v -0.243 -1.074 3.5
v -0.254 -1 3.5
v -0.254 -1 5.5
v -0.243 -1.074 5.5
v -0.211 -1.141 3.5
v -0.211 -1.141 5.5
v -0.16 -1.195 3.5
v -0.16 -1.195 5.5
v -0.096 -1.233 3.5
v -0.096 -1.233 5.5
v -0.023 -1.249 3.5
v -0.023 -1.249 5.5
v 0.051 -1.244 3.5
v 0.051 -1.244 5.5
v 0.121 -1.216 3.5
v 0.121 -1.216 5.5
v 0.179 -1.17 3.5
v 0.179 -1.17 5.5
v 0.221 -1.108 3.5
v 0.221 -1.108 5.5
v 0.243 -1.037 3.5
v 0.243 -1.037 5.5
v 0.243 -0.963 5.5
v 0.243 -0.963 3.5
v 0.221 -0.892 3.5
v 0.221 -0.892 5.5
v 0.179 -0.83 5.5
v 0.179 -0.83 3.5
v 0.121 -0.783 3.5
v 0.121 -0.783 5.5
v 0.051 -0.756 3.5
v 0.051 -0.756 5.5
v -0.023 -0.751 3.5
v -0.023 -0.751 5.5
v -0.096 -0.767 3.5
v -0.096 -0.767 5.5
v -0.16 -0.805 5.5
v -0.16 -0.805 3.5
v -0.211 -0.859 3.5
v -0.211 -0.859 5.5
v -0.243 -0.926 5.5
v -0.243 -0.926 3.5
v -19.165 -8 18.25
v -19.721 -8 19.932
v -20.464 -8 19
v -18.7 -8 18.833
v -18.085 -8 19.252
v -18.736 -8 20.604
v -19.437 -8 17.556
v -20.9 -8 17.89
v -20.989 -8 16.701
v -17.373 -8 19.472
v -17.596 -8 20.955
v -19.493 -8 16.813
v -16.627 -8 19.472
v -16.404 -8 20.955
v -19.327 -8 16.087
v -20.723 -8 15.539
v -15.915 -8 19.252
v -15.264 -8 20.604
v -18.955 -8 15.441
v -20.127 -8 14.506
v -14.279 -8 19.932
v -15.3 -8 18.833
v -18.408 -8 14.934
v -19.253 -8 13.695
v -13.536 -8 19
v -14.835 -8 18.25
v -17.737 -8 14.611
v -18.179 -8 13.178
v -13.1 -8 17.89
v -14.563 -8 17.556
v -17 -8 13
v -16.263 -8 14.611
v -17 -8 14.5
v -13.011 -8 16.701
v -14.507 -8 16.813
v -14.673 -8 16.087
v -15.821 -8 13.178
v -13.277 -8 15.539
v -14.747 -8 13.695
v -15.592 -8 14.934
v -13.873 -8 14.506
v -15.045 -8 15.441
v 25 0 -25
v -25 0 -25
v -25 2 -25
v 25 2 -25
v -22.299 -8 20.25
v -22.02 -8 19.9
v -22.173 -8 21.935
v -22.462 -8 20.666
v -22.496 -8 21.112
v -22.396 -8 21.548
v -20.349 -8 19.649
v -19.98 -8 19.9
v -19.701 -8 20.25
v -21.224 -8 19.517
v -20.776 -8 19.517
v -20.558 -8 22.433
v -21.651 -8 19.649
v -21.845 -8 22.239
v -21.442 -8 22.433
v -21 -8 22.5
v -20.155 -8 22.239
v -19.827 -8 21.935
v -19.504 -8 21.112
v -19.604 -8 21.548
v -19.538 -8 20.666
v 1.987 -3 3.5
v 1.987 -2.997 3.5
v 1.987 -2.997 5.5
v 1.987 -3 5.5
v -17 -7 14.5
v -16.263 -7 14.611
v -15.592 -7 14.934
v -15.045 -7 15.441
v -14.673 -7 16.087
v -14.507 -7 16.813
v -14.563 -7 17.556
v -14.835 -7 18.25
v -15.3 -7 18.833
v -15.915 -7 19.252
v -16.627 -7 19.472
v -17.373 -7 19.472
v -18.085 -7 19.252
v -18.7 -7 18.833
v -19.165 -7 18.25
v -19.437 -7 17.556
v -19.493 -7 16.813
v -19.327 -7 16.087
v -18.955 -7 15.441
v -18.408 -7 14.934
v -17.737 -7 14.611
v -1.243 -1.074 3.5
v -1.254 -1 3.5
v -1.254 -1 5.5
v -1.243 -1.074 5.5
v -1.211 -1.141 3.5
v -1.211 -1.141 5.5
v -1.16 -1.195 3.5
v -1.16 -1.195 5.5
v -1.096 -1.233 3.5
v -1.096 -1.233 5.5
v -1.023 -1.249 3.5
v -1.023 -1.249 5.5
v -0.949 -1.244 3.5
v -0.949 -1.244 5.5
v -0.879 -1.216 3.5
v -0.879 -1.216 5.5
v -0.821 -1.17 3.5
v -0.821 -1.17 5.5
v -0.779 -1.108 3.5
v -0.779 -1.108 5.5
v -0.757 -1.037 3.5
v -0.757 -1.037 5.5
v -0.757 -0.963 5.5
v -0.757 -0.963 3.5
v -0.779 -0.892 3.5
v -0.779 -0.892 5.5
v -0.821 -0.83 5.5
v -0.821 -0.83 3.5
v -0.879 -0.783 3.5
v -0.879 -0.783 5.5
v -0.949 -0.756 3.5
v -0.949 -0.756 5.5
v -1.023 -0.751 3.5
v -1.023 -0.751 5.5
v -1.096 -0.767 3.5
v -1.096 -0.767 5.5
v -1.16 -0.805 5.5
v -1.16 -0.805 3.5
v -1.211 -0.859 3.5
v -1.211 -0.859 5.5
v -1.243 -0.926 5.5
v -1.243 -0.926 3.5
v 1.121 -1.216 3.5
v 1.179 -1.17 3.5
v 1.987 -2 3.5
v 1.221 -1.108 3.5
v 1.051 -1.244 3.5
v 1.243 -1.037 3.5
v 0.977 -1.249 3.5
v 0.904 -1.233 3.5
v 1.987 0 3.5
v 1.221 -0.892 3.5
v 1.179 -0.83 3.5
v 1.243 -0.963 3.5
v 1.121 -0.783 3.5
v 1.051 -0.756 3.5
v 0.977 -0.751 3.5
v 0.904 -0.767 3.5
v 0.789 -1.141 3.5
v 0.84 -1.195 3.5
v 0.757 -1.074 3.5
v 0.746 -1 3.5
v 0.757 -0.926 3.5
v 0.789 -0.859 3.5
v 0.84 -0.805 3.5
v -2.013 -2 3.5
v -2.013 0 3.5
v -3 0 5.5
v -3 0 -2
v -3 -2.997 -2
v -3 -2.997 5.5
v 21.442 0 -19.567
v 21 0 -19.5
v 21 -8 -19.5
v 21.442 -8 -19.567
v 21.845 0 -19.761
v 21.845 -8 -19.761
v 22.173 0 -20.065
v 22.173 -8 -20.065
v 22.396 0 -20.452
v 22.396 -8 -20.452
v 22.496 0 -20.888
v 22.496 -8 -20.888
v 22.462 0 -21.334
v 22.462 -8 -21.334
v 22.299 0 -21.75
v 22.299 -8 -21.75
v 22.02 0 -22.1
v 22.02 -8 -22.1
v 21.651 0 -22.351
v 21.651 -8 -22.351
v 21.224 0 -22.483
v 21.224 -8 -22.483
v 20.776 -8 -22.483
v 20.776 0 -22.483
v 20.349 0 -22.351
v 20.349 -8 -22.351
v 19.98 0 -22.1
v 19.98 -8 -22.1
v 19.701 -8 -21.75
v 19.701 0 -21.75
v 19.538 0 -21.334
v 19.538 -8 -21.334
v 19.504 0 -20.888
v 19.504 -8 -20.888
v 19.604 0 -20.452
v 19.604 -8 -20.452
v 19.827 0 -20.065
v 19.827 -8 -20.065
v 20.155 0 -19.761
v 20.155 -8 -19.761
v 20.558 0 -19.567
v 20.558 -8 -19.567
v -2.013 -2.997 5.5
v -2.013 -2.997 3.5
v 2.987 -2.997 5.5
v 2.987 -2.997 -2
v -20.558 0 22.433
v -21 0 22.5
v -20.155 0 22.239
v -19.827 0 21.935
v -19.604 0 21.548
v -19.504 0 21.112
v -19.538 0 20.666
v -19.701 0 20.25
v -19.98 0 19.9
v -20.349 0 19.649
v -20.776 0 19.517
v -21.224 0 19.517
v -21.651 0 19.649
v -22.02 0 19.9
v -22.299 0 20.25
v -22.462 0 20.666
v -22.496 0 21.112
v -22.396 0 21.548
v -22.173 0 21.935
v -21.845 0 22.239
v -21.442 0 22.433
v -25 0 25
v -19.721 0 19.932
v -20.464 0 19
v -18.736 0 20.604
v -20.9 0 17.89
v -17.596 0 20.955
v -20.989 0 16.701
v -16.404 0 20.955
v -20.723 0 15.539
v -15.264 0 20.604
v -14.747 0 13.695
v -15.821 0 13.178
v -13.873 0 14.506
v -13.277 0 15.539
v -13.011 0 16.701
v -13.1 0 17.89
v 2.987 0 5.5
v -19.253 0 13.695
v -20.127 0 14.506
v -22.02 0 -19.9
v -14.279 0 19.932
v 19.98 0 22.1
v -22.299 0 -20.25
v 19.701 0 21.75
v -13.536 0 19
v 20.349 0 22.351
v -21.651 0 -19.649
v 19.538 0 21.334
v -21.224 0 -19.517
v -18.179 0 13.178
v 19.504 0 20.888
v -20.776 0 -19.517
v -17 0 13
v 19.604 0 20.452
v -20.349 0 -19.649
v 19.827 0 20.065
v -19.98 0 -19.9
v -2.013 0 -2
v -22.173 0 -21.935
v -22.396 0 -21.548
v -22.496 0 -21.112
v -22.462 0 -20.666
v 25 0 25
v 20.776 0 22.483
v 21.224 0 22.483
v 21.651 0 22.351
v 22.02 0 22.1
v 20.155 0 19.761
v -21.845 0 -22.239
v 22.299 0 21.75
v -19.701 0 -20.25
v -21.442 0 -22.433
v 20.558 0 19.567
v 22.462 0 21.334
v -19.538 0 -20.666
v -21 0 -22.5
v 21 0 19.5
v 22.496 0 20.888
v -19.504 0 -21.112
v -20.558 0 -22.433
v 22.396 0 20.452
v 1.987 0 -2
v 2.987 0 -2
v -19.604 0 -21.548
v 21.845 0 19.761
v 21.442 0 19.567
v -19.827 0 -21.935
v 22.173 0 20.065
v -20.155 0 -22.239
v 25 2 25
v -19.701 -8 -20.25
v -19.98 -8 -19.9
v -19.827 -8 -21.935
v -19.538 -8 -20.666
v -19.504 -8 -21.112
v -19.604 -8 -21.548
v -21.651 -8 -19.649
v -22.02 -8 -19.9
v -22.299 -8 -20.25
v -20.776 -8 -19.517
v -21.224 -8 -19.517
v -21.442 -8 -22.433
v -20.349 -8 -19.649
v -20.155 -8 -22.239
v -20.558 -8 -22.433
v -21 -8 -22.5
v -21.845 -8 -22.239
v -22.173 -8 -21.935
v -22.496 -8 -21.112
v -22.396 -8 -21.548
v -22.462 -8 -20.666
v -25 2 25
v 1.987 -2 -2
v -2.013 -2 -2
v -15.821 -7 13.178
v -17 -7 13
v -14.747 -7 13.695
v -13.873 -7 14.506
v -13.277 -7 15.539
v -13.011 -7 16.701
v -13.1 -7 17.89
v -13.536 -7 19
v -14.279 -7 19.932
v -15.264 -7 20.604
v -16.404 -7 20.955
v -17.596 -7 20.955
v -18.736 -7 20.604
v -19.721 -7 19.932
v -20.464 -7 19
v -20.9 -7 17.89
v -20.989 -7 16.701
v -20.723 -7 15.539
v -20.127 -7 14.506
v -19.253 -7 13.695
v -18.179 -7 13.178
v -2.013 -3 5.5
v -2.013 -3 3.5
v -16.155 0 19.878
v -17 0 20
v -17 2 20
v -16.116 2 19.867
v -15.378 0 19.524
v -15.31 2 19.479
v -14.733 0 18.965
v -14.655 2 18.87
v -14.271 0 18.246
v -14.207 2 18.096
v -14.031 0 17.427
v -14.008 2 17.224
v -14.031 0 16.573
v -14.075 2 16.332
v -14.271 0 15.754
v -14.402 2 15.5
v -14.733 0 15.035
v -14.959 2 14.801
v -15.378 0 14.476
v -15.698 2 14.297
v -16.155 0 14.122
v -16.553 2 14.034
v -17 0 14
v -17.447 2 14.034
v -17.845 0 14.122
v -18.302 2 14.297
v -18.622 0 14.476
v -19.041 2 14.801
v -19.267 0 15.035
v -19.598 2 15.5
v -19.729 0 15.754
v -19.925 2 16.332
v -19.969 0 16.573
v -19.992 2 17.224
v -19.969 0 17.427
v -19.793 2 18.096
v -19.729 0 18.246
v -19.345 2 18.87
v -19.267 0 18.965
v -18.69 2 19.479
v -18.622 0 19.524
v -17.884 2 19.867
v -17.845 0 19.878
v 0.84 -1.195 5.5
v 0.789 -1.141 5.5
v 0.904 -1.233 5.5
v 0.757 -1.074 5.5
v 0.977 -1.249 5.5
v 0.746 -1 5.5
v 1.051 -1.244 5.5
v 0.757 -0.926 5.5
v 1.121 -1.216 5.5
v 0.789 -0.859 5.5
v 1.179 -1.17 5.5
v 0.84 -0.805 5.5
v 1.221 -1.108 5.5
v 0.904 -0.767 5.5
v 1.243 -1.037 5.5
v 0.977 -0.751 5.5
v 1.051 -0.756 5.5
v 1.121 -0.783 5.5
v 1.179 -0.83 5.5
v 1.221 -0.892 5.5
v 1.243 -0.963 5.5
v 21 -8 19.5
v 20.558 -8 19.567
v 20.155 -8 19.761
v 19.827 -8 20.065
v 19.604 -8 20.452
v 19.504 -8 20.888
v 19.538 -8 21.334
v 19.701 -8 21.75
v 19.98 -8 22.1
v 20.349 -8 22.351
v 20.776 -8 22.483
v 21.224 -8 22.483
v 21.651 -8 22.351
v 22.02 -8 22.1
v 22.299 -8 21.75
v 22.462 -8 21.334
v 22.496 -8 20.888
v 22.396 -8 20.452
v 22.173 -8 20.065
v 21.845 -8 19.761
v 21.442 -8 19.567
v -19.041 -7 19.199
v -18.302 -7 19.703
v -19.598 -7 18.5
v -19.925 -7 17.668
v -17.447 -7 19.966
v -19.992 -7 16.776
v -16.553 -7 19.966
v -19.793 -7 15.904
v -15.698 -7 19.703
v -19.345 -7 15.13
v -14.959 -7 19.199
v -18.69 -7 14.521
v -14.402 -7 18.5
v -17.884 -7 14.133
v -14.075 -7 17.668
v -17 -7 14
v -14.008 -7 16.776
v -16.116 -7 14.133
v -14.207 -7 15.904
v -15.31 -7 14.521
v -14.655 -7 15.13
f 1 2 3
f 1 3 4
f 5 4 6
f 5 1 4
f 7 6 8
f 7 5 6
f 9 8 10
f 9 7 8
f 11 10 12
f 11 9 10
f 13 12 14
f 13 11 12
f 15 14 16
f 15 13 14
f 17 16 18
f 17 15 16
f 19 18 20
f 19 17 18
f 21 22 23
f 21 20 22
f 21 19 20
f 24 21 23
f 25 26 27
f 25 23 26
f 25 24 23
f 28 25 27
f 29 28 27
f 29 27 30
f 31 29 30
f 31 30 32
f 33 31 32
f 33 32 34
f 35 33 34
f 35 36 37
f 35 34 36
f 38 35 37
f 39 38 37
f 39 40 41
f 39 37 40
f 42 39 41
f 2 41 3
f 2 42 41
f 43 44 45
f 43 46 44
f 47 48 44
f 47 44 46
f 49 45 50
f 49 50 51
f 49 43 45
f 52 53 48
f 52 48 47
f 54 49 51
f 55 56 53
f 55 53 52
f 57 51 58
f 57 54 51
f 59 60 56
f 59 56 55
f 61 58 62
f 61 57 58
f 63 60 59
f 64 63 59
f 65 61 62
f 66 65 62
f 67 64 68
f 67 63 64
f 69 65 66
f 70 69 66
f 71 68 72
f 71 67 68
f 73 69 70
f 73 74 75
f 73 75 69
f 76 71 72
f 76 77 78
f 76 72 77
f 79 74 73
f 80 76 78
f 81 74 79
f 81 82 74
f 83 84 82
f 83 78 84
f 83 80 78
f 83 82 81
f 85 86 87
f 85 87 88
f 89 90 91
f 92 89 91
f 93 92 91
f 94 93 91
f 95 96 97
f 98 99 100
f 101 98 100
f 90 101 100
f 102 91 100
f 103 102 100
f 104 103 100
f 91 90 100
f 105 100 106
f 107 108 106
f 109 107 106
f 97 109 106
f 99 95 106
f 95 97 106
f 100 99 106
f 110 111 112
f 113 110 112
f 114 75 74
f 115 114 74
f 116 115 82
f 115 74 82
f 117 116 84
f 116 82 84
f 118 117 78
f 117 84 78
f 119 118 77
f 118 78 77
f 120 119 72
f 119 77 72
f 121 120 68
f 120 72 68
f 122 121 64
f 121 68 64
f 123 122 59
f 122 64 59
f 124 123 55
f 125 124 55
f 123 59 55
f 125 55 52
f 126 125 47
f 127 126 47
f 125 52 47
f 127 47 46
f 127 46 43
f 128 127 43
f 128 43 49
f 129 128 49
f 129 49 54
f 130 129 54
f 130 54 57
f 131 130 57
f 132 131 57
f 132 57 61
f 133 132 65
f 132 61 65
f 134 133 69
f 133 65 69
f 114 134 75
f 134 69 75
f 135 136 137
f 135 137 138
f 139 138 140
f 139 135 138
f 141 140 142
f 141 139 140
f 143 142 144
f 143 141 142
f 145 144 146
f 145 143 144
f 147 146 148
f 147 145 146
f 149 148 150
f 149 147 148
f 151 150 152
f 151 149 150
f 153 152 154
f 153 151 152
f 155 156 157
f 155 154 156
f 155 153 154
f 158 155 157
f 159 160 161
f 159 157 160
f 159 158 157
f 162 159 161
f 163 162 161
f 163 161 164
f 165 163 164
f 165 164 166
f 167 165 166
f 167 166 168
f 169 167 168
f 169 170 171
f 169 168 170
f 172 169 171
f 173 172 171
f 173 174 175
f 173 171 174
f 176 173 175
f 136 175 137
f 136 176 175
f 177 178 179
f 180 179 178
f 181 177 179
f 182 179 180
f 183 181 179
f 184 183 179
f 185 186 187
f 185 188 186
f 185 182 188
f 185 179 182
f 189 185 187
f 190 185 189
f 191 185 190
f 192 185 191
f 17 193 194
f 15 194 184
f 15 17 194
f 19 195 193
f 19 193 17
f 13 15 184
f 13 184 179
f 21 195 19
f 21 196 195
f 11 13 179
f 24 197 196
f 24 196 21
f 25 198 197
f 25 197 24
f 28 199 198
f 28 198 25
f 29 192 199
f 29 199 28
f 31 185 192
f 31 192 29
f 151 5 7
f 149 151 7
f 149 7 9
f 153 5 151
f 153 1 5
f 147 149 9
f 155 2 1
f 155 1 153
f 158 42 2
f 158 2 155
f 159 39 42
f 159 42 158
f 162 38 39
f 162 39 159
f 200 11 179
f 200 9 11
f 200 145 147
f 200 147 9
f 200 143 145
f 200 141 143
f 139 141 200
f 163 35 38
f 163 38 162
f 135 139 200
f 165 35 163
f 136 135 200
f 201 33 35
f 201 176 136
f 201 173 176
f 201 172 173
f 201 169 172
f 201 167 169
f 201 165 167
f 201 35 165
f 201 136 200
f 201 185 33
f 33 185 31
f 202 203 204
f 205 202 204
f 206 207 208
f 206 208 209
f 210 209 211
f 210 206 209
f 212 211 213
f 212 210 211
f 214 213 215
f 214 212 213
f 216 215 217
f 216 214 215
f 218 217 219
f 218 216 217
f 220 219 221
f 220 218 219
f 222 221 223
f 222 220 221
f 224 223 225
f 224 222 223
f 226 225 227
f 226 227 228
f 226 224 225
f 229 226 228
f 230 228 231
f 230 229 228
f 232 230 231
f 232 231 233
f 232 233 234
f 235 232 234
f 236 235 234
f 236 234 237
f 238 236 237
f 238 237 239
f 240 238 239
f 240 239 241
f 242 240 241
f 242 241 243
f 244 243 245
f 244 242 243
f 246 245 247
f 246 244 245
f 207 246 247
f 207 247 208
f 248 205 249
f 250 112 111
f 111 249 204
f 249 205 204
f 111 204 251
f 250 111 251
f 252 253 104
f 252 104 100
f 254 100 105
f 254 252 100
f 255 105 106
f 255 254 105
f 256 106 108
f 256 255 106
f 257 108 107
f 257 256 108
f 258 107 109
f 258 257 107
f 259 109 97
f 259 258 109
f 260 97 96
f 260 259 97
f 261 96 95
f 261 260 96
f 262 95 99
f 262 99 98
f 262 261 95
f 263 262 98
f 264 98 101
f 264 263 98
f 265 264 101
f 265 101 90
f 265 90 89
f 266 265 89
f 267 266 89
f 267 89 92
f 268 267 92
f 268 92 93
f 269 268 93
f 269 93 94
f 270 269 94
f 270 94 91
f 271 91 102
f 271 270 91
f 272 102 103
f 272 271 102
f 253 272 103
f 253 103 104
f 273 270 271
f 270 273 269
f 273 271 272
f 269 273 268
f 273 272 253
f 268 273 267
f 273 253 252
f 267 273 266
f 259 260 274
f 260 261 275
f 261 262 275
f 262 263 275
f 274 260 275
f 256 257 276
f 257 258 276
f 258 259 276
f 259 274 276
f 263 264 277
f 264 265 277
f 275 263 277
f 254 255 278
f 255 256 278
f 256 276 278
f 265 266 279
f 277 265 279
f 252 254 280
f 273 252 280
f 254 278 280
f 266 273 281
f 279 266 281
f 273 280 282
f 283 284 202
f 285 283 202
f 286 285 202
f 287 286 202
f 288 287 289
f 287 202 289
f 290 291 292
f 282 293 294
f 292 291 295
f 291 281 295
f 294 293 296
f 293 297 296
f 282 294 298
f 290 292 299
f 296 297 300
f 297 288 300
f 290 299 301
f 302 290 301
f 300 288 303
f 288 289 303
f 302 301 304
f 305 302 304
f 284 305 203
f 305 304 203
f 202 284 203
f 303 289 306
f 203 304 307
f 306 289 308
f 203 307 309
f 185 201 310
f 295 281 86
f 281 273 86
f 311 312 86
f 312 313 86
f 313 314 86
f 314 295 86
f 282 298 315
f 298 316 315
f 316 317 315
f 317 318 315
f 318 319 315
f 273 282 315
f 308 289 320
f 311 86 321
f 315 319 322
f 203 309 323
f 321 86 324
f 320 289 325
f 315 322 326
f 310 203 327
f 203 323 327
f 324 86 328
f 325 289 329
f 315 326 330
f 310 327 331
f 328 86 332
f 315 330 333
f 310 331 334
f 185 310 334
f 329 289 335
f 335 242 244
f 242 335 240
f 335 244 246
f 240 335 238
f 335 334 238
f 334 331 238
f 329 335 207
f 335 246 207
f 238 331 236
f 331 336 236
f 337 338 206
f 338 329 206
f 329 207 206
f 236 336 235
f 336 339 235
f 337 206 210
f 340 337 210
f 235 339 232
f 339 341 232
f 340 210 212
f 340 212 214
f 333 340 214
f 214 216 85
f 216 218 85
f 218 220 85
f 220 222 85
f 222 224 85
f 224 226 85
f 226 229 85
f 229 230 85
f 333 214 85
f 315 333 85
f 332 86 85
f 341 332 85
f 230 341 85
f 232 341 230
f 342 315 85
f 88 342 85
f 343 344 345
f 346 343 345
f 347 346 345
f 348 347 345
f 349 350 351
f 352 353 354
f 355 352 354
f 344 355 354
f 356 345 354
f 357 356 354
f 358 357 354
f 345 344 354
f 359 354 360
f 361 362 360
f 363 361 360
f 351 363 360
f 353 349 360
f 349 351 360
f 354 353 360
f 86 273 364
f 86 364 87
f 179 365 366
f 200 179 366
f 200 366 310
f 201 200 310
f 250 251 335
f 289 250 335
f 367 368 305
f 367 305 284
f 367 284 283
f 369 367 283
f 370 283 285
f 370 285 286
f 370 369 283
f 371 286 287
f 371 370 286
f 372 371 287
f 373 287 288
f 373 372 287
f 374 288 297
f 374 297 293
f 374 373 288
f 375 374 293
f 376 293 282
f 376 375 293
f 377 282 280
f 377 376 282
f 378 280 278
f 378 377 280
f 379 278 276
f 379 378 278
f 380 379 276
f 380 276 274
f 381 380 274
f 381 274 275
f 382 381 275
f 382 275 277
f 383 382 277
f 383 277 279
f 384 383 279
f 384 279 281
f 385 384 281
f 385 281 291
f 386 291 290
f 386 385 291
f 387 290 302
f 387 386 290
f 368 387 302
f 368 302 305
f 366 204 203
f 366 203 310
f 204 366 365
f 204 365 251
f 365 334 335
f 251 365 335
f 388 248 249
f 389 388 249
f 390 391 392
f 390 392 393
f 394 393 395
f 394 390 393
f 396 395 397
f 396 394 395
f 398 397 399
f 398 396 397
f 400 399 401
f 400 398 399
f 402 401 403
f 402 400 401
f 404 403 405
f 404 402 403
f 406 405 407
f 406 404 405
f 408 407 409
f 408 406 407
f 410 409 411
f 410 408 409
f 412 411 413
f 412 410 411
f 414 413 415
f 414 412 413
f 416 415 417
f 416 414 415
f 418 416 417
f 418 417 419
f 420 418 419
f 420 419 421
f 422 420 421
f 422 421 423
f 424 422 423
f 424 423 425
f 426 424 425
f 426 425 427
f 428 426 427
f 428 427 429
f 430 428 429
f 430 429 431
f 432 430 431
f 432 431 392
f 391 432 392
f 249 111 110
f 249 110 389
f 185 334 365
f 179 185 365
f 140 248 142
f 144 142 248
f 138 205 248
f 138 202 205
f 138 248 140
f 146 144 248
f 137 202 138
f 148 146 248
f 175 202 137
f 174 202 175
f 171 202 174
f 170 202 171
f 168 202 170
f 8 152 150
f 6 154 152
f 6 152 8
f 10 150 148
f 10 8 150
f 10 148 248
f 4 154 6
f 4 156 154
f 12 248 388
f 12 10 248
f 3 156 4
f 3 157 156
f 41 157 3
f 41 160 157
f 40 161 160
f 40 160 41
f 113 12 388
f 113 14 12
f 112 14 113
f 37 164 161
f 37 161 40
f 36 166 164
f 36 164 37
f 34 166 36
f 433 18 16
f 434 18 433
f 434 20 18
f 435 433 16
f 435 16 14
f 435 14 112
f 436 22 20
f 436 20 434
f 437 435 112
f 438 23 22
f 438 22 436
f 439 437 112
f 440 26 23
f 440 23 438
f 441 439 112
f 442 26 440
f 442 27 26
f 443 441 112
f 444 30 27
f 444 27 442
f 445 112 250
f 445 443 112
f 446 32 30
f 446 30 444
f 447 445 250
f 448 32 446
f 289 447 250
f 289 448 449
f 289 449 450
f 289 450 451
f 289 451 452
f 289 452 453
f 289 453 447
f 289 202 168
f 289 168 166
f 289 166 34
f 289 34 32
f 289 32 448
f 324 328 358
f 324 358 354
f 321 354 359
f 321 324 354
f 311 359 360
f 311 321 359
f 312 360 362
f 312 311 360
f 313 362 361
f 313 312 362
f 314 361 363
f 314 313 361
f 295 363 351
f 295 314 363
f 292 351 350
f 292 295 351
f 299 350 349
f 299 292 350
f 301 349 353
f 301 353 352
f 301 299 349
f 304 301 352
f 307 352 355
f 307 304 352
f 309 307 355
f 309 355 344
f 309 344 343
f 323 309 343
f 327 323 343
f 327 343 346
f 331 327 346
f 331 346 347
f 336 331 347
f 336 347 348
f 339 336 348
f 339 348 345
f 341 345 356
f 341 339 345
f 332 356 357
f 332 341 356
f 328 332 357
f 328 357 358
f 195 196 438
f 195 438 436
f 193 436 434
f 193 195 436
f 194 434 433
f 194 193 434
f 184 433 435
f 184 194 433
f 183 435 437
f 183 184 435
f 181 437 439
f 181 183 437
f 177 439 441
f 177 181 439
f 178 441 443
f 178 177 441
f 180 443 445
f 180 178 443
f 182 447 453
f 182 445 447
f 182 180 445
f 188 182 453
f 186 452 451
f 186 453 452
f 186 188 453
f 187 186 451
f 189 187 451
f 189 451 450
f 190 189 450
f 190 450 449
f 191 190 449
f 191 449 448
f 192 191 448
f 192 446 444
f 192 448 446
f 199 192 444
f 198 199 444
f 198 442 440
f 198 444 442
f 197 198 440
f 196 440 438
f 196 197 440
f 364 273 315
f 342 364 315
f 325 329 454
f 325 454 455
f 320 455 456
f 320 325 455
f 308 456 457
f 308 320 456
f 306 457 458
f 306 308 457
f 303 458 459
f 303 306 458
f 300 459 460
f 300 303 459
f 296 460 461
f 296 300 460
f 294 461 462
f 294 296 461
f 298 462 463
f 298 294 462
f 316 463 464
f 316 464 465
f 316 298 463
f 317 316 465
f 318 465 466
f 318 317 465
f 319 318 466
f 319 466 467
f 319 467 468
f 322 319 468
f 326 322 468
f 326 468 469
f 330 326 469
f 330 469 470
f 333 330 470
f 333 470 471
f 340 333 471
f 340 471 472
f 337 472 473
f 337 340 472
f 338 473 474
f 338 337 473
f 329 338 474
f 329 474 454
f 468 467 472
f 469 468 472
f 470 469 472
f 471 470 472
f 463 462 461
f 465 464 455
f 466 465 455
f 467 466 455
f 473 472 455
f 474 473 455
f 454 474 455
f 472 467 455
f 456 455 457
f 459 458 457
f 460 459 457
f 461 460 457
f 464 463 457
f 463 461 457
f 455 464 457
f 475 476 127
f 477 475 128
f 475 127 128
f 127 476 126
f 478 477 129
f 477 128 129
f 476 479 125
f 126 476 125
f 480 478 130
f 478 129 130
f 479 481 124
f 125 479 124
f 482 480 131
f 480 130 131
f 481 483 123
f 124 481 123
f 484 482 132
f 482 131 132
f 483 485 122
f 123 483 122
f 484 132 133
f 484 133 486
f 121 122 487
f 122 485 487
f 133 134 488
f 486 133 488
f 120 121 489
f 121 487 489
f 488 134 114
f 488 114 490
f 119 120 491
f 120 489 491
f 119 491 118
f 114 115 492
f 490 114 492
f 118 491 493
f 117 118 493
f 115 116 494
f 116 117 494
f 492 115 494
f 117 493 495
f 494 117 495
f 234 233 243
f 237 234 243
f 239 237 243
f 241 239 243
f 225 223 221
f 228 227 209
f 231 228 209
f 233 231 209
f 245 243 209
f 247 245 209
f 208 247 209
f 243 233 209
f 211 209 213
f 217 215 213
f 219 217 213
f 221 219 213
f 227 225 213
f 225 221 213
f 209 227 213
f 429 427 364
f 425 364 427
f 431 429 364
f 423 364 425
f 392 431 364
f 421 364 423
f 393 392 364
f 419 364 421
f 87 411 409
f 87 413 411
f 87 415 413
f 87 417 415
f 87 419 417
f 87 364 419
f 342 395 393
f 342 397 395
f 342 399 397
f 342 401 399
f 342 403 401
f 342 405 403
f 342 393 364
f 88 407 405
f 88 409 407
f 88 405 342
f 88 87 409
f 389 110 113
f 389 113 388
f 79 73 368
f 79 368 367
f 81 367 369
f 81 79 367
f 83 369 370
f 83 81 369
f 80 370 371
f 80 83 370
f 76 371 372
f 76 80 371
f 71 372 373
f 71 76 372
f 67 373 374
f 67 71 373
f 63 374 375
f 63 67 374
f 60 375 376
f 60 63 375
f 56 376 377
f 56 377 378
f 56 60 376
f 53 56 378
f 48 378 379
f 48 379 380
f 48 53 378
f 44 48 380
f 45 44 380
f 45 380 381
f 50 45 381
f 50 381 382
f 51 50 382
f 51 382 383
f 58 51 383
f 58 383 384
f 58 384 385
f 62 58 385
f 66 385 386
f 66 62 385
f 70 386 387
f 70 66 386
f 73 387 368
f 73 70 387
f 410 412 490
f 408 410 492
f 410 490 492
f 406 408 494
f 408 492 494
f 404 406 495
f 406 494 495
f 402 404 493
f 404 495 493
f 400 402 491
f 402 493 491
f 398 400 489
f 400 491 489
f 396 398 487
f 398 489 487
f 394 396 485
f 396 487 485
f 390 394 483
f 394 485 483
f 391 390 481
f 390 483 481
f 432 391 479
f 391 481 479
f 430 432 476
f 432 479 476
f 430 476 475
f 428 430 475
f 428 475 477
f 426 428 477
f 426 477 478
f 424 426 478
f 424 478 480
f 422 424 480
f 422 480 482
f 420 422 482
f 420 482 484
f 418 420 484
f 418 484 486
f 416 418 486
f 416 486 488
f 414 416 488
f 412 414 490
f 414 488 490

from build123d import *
from build123d.topology import SkipClean

# Parameters (mm, degrees)
SKETCH1_W           = 50
SKETCH1_H           = 50
TOP_DEPTH           = 2
CONNECTER_DEPTH     = 3
SKETCH3_R           = 0.25
CONNECTER_CUT_DEPTH = 10
BRACE_DEPTH         = 5.5
BRACE_DEPTH_BACK    = 2
SKETCH6_R           = 3
LED_CUTOUT_DEPTH    = 2
LED_START           = 7
SKETCH7_R           = 4
SKETCH7_R_2         = 3
LED_COVER_DEPTH     = 7
LED_START_2         = 8
SKETCH8_R           = 4
SKETCH8_R_2         = 2.5
LED_FASTENER_DEPTH  = 1
SKETCH9_R           = 1.5
DOWEL_JOINTS_DEPTH  = 8


with BuildPart() as part:
    # Sketch1 → Top (new body)
    with BuildSketch(Plane(origin=(0, 0, 0), x_dir=(1, 0, 0), z_dir=(0, 1, 0))):
        Rectangle(SKETCH1_W, SKETCH1_H)
    extrude(amount=TOP_DEPTH)

    # Sketch2 → Connecter (add)
    with BuildSketch(Plane(origin=(0, 0, 0), x_dir=(1, 0, 0), z_dir=(0, 1, 0))):
        Polygon((-0.522021456, -3.5), (0.496536082, -3.5), (1.112257313, -3.5), (1.987257313, -3.5), (1.987257313, -5.5), (-2.012742687, -5.5), (-2.012742687, -3.5), (-1.137742687, -3.5), align=None)
    extrude(amount=-CONNECTER_DEPTH)

    # Sketch3 → Connecter Cut (cut)
    with BuildSketch(Plane.XY):
        with Locations(Location((-0.004247524, -0.999990979, 0), (0, 0, 180))):
            Circle(SKETCH3_R)
        with Locations(Location((-1.004247524, -0.999990979, 0), (0, 0, 180))):
            Circle(SKETCH3_R)
        with Locations(Location((0.995752476, -0.999990979, 0), (0, 0, 180))):
            Circle(SKETCH3_R)
    extrude(amount=CONNECTER_CUT_DEPTH, mode=Mode.SUBTRACT)

    # Sketch5 → Brace (add, two sides: drawn at the far end of the back side and taken through both)
    with BuildSketch(Plane.XY.offset(-BRACE_DEPTH_BACK)):
        Polygon((2.987257313, 0), (1.987257313, 0), (1.987257313, -2), (-0.006371344, -2), (-2.012742687, -2), (-2.012742687, 0), (-3, 0), (-3, -2.996768929), (2.987257313, -2.996768929), align=None)
    extrude(amount=BRACE_DEPTH + BRACE_DEPTH_BACK)

    # Sketch6 → LED Cutout (cut)
    with BuildSketch(Plane(origin=(0, 0, 0), x_dir=(1, 0, 0), z_dir=(0, 1, 0))):
        with Locations(Location((-17, -17, 0), (0, 0, 270))):
            Circle(SKETCH6_R)
    extrude(amount=LED_CUTOUT_DEPTH, mode=Mode.SUBTRACT)

    # Sketch7 → LED Cover (add)
    with SkipClean():  # the faces are left unmerged after this step: merging them gives an invalid solid
        with BuildSketch(Plane.XZ.offset(LED_START)):
            with Locations(Location((-17, 17, 0), (0, 0, 270))):
                Circle(SKETCH7_R)
            with Locations(Location((-17, 17, 0), (0, 0, 270))):
                Circle(SKETCH7_R_2, mode=Mode.SUBTRACT)
        extrude(amount=-LED_COVER_DEPTH)

    # Sketch8 → LED Fastener (add)
    with SkipClean():  # the faces are left unmerged after this step: merging them gives an invalid solid
        with BuildSketch(Plane.XZ.offset(LED_START_2)):
            with Locations(Location((-17, 17, 0), (0, 0, 270))):
                Circle(SKETCH8_R)
            with Locations(Location((-17, 17, 0), (0, 0, 270))):
                Circle(SKETCH8_R_2, mode=Mode.SUBTRACT)
        extrude(amount=-LED_FASTENER_DEPTH)

    # Sketch9 → Dowel Joints (add)
    with SkipClean():  # the faces are left unmerged after this step: merging them gives an invalid solid
        with BuildSketch(Plane(origin=(0, 0, 0), x_dir=(1, 0, 0), z_dir=(0, 1, 0))):
            with Locations(Location((-21, -21, 0), (0, 0, 270))):
                Circle(SKETCH9_R)
            with Locations(Location((21, -21, 0), (0, 0, 90))):
                Circle(SKETCH9_R)
            with Locations(Location((21, 21, 0), (0, 0, 270))):
                Circle(SKETCH9_R)
            with Locations(Location((-21, 21, 0), (0, 0, 90))):
                Circle(SKETCH9_R)
        extrude(amount=-DOWEL_JOINTS_DEPTH)


solid = part.part
